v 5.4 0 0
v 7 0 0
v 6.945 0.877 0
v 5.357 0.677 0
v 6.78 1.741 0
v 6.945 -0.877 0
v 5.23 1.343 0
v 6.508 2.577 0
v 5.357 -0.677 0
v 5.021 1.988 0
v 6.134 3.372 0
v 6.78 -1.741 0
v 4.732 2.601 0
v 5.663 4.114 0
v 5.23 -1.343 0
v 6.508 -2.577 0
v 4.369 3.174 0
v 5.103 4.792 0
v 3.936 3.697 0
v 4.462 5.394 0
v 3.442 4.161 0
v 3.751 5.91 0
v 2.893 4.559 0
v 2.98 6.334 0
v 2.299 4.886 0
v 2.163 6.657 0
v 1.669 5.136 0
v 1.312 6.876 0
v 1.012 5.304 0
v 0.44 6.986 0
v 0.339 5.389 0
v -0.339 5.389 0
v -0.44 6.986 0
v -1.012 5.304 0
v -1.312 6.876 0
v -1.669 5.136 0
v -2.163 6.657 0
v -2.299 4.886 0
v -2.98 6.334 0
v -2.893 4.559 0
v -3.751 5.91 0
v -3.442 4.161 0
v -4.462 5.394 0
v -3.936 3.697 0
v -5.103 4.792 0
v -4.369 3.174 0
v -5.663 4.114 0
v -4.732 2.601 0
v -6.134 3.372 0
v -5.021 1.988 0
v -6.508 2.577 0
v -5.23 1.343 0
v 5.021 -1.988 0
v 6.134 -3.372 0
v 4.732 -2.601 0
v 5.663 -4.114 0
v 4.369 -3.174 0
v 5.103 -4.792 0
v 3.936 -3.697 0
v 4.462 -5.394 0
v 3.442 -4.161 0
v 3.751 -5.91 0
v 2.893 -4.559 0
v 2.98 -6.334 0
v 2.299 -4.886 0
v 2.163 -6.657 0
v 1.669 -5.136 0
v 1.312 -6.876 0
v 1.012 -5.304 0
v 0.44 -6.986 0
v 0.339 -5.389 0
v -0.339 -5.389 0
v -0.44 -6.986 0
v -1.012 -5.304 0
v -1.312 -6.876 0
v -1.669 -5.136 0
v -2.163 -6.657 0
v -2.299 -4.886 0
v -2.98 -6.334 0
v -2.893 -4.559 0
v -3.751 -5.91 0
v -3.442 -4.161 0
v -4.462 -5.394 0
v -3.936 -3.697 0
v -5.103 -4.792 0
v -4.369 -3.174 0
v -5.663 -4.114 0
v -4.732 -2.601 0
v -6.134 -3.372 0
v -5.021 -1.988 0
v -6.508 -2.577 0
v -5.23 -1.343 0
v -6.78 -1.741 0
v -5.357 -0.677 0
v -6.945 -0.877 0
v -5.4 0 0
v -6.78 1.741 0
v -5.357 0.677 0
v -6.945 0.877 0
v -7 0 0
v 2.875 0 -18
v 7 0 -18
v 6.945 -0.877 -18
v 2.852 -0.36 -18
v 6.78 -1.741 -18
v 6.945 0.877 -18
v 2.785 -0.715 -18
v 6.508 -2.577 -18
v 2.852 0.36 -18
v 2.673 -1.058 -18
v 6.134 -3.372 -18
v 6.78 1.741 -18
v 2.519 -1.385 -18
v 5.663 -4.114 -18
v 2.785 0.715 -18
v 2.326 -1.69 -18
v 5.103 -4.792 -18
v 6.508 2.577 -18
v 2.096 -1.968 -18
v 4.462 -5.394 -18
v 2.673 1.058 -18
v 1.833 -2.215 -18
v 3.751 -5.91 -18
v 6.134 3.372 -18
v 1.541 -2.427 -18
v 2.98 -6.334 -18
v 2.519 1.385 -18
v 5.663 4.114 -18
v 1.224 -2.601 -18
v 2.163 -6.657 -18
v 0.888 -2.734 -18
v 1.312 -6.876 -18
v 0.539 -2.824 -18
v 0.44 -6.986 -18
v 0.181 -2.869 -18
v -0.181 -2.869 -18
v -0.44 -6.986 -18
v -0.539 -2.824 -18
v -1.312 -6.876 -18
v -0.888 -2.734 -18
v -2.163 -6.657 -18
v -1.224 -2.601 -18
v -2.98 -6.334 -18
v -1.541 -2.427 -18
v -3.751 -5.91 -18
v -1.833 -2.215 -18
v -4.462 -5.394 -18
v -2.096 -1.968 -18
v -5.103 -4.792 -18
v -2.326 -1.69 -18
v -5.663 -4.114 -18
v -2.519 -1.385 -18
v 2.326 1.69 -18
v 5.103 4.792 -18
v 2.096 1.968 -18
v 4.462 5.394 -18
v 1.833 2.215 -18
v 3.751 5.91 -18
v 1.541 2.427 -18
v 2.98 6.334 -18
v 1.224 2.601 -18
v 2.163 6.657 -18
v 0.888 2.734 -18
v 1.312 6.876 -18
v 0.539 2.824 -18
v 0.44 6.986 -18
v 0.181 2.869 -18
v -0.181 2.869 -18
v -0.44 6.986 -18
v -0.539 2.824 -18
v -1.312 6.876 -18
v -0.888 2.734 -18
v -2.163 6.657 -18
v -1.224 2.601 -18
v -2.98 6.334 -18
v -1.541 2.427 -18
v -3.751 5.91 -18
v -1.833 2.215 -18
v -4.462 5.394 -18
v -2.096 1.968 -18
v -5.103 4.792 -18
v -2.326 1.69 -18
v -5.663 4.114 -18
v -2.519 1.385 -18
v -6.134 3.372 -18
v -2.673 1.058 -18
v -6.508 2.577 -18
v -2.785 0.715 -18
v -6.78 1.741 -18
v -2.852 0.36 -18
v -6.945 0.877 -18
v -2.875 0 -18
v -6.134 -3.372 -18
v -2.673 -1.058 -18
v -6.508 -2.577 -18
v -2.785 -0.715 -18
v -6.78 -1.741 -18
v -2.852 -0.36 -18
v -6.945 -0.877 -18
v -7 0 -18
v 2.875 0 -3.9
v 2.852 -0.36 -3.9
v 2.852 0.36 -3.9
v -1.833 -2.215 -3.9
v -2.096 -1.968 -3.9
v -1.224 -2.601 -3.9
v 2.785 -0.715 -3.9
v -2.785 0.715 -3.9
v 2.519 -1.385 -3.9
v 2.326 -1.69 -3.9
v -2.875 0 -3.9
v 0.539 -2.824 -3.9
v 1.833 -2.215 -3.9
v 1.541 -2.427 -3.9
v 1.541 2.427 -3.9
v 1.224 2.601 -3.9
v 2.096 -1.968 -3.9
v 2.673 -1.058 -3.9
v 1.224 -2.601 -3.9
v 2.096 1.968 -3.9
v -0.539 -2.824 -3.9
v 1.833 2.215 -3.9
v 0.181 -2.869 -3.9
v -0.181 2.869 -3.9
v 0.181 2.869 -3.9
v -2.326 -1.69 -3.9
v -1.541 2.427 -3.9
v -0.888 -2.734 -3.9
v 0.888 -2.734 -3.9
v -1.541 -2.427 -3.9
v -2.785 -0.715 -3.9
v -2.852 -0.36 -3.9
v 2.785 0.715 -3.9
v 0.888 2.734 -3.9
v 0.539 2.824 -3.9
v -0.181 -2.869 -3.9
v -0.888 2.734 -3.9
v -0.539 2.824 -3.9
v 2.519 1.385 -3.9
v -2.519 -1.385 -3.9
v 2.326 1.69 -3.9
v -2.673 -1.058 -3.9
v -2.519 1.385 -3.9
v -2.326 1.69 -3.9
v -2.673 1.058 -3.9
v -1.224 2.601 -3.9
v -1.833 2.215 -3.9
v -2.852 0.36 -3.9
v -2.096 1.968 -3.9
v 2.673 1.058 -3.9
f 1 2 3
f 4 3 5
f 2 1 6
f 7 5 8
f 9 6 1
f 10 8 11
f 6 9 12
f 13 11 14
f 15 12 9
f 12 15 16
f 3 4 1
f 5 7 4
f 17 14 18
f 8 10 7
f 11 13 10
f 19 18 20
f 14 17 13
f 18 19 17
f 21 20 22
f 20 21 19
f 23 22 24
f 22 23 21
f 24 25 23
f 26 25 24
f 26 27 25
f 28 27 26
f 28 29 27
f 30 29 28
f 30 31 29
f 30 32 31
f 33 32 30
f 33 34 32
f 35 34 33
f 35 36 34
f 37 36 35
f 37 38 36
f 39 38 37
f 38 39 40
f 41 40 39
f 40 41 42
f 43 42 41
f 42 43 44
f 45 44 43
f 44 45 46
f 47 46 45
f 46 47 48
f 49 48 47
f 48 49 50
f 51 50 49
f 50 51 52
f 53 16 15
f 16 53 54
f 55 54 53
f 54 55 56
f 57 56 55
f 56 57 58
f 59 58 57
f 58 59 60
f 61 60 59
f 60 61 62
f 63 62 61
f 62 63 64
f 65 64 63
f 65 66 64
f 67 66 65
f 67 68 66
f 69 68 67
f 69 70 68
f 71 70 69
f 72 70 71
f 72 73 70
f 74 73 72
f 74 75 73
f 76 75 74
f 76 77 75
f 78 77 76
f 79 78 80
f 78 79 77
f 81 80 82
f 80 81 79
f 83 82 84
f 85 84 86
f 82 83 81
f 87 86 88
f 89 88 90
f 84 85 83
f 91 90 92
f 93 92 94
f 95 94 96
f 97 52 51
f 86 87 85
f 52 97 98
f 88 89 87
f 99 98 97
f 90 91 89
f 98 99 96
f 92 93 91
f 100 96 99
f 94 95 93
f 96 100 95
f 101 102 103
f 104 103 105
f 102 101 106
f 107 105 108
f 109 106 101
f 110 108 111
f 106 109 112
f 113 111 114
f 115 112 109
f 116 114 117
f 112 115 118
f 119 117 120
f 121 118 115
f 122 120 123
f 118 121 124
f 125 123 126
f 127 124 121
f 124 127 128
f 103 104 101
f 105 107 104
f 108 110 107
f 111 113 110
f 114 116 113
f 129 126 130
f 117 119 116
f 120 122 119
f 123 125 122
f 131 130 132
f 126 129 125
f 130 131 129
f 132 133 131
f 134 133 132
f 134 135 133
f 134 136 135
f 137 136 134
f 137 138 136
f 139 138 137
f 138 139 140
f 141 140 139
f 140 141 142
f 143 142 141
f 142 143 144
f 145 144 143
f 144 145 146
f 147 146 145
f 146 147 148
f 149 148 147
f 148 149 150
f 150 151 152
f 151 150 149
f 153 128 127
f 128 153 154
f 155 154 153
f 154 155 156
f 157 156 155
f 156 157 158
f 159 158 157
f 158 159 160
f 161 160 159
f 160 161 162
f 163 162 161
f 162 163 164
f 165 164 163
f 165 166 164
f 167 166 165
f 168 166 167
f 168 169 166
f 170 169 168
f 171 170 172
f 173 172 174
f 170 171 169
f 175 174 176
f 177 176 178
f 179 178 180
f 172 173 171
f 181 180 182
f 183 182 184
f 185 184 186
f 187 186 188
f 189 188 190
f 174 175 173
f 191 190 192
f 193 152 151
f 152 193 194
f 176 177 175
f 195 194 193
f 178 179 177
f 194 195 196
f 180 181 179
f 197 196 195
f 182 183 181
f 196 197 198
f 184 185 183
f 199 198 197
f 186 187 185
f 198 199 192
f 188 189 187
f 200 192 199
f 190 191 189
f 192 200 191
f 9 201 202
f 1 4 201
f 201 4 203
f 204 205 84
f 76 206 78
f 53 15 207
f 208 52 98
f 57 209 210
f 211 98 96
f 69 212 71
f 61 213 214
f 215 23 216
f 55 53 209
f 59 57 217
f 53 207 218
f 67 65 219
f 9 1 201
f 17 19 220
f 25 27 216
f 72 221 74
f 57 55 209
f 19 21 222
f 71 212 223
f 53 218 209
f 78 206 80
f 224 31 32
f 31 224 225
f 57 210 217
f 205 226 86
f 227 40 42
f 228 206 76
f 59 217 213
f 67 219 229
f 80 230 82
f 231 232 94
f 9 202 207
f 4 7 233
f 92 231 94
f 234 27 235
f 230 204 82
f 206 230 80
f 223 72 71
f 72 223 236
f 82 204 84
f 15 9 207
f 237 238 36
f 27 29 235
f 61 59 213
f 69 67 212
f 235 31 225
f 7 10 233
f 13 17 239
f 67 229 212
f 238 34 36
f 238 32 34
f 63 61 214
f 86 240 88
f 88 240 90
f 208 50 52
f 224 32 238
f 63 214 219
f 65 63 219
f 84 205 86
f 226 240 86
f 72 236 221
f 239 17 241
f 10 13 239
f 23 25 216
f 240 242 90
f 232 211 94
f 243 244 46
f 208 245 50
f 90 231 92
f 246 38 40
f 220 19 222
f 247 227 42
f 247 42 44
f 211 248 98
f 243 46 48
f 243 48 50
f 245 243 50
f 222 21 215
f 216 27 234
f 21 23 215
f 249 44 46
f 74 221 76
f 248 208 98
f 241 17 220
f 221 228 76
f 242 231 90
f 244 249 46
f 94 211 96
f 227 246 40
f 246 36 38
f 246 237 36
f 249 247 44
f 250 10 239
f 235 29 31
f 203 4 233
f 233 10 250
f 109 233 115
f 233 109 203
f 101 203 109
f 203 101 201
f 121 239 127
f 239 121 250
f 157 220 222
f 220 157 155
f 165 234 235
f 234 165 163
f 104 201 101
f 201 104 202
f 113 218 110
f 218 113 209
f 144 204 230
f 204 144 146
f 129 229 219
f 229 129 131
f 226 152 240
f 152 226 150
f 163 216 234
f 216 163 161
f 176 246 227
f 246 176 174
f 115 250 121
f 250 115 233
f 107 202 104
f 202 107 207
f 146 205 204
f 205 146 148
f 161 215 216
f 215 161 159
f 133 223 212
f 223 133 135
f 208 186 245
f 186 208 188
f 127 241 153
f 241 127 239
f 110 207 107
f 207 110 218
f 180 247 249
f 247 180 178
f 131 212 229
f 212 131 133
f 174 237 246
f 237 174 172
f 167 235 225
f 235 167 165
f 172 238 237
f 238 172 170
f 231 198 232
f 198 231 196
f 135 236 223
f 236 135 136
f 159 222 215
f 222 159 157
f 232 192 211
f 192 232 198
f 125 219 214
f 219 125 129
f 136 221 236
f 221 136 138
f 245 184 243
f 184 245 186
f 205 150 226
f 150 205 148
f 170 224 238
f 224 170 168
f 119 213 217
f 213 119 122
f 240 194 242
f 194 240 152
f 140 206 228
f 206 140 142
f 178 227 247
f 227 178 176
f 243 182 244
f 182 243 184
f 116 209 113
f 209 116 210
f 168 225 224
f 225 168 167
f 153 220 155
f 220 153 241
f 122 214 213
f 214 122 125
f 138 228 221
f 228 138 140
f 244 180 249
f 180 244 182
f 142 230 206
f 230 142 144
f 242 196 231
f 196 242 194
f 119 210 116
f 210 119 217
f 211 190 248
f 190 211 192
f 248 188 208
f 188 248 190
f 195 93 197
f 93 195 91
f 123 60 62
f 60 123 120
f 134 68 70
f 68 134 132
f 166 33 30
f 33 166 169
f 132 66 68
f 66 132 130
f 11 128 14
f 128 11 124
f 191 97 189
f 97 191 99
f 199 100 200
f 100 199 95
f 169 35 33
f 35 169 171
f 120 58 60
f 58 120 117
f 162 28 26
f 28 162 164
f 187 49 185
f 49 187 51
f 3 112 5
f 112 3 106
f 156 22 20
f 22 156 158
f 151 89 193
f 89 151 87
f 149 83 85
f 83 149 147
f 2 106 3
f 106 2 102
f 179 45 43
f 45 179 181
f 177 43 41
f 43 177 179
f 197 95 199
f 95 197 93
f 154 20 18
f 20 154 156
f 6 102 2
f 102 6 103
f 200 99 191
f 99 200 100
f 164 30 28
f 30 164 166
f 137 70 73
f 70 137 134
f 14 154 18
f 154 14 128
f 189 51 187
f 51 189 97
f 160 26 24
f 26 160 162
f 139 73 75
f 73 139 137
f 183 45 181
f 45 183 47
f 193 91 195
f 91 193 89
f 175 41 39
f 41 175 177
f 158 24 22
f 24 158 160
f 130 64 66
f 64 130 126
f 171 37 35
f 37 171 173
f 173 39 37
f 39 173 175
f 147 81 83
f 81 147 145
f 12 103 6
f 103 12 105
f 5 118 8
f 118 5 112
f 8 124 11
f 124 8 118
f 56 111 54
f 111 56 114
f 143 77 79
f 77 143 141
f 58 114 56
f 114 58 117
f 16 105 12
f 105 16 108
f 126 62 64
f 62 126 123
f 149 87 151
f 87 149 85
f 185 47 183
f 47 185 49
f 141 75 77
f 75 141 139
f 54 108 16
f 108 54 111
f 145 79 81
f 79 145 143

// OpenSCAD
$fn = 50;


difference() {
	union() {
		translate(v = [0, 0, -18.0000000000]) {
			cylinder(h = 18, r = 7.0000000000);
		}
		cylinder(h = 0, r = 16.0000000000);
	}
	union() {
		translate(v = [0, 0, 0]) {
			rotate(a = [0, 0, 0]) {
				difference() {
					union() {
						#translate(v = [0, 0, -18.0000000000]) {
							cylinder(h = 18, r = 2.6000000000);
						}
						#translate(v = [0, 0, -3.9000000000]) {
							cylinder(h = 3.9000000000, r = 7.0000000000, r1 = 2.8750000000, r2 = 5.4000000000);
						}
						#translate(v = [0, 0, -18.0000000000]) {
							cylinder(h = 18, r = 2.8750000000);
						}
						#translate(v = [0, 0, -18.0000000000]) {
							cylinder(h = 18, r = 2.6000000000);
						}
					}
					union();
				}
			}
		}
	}
}
